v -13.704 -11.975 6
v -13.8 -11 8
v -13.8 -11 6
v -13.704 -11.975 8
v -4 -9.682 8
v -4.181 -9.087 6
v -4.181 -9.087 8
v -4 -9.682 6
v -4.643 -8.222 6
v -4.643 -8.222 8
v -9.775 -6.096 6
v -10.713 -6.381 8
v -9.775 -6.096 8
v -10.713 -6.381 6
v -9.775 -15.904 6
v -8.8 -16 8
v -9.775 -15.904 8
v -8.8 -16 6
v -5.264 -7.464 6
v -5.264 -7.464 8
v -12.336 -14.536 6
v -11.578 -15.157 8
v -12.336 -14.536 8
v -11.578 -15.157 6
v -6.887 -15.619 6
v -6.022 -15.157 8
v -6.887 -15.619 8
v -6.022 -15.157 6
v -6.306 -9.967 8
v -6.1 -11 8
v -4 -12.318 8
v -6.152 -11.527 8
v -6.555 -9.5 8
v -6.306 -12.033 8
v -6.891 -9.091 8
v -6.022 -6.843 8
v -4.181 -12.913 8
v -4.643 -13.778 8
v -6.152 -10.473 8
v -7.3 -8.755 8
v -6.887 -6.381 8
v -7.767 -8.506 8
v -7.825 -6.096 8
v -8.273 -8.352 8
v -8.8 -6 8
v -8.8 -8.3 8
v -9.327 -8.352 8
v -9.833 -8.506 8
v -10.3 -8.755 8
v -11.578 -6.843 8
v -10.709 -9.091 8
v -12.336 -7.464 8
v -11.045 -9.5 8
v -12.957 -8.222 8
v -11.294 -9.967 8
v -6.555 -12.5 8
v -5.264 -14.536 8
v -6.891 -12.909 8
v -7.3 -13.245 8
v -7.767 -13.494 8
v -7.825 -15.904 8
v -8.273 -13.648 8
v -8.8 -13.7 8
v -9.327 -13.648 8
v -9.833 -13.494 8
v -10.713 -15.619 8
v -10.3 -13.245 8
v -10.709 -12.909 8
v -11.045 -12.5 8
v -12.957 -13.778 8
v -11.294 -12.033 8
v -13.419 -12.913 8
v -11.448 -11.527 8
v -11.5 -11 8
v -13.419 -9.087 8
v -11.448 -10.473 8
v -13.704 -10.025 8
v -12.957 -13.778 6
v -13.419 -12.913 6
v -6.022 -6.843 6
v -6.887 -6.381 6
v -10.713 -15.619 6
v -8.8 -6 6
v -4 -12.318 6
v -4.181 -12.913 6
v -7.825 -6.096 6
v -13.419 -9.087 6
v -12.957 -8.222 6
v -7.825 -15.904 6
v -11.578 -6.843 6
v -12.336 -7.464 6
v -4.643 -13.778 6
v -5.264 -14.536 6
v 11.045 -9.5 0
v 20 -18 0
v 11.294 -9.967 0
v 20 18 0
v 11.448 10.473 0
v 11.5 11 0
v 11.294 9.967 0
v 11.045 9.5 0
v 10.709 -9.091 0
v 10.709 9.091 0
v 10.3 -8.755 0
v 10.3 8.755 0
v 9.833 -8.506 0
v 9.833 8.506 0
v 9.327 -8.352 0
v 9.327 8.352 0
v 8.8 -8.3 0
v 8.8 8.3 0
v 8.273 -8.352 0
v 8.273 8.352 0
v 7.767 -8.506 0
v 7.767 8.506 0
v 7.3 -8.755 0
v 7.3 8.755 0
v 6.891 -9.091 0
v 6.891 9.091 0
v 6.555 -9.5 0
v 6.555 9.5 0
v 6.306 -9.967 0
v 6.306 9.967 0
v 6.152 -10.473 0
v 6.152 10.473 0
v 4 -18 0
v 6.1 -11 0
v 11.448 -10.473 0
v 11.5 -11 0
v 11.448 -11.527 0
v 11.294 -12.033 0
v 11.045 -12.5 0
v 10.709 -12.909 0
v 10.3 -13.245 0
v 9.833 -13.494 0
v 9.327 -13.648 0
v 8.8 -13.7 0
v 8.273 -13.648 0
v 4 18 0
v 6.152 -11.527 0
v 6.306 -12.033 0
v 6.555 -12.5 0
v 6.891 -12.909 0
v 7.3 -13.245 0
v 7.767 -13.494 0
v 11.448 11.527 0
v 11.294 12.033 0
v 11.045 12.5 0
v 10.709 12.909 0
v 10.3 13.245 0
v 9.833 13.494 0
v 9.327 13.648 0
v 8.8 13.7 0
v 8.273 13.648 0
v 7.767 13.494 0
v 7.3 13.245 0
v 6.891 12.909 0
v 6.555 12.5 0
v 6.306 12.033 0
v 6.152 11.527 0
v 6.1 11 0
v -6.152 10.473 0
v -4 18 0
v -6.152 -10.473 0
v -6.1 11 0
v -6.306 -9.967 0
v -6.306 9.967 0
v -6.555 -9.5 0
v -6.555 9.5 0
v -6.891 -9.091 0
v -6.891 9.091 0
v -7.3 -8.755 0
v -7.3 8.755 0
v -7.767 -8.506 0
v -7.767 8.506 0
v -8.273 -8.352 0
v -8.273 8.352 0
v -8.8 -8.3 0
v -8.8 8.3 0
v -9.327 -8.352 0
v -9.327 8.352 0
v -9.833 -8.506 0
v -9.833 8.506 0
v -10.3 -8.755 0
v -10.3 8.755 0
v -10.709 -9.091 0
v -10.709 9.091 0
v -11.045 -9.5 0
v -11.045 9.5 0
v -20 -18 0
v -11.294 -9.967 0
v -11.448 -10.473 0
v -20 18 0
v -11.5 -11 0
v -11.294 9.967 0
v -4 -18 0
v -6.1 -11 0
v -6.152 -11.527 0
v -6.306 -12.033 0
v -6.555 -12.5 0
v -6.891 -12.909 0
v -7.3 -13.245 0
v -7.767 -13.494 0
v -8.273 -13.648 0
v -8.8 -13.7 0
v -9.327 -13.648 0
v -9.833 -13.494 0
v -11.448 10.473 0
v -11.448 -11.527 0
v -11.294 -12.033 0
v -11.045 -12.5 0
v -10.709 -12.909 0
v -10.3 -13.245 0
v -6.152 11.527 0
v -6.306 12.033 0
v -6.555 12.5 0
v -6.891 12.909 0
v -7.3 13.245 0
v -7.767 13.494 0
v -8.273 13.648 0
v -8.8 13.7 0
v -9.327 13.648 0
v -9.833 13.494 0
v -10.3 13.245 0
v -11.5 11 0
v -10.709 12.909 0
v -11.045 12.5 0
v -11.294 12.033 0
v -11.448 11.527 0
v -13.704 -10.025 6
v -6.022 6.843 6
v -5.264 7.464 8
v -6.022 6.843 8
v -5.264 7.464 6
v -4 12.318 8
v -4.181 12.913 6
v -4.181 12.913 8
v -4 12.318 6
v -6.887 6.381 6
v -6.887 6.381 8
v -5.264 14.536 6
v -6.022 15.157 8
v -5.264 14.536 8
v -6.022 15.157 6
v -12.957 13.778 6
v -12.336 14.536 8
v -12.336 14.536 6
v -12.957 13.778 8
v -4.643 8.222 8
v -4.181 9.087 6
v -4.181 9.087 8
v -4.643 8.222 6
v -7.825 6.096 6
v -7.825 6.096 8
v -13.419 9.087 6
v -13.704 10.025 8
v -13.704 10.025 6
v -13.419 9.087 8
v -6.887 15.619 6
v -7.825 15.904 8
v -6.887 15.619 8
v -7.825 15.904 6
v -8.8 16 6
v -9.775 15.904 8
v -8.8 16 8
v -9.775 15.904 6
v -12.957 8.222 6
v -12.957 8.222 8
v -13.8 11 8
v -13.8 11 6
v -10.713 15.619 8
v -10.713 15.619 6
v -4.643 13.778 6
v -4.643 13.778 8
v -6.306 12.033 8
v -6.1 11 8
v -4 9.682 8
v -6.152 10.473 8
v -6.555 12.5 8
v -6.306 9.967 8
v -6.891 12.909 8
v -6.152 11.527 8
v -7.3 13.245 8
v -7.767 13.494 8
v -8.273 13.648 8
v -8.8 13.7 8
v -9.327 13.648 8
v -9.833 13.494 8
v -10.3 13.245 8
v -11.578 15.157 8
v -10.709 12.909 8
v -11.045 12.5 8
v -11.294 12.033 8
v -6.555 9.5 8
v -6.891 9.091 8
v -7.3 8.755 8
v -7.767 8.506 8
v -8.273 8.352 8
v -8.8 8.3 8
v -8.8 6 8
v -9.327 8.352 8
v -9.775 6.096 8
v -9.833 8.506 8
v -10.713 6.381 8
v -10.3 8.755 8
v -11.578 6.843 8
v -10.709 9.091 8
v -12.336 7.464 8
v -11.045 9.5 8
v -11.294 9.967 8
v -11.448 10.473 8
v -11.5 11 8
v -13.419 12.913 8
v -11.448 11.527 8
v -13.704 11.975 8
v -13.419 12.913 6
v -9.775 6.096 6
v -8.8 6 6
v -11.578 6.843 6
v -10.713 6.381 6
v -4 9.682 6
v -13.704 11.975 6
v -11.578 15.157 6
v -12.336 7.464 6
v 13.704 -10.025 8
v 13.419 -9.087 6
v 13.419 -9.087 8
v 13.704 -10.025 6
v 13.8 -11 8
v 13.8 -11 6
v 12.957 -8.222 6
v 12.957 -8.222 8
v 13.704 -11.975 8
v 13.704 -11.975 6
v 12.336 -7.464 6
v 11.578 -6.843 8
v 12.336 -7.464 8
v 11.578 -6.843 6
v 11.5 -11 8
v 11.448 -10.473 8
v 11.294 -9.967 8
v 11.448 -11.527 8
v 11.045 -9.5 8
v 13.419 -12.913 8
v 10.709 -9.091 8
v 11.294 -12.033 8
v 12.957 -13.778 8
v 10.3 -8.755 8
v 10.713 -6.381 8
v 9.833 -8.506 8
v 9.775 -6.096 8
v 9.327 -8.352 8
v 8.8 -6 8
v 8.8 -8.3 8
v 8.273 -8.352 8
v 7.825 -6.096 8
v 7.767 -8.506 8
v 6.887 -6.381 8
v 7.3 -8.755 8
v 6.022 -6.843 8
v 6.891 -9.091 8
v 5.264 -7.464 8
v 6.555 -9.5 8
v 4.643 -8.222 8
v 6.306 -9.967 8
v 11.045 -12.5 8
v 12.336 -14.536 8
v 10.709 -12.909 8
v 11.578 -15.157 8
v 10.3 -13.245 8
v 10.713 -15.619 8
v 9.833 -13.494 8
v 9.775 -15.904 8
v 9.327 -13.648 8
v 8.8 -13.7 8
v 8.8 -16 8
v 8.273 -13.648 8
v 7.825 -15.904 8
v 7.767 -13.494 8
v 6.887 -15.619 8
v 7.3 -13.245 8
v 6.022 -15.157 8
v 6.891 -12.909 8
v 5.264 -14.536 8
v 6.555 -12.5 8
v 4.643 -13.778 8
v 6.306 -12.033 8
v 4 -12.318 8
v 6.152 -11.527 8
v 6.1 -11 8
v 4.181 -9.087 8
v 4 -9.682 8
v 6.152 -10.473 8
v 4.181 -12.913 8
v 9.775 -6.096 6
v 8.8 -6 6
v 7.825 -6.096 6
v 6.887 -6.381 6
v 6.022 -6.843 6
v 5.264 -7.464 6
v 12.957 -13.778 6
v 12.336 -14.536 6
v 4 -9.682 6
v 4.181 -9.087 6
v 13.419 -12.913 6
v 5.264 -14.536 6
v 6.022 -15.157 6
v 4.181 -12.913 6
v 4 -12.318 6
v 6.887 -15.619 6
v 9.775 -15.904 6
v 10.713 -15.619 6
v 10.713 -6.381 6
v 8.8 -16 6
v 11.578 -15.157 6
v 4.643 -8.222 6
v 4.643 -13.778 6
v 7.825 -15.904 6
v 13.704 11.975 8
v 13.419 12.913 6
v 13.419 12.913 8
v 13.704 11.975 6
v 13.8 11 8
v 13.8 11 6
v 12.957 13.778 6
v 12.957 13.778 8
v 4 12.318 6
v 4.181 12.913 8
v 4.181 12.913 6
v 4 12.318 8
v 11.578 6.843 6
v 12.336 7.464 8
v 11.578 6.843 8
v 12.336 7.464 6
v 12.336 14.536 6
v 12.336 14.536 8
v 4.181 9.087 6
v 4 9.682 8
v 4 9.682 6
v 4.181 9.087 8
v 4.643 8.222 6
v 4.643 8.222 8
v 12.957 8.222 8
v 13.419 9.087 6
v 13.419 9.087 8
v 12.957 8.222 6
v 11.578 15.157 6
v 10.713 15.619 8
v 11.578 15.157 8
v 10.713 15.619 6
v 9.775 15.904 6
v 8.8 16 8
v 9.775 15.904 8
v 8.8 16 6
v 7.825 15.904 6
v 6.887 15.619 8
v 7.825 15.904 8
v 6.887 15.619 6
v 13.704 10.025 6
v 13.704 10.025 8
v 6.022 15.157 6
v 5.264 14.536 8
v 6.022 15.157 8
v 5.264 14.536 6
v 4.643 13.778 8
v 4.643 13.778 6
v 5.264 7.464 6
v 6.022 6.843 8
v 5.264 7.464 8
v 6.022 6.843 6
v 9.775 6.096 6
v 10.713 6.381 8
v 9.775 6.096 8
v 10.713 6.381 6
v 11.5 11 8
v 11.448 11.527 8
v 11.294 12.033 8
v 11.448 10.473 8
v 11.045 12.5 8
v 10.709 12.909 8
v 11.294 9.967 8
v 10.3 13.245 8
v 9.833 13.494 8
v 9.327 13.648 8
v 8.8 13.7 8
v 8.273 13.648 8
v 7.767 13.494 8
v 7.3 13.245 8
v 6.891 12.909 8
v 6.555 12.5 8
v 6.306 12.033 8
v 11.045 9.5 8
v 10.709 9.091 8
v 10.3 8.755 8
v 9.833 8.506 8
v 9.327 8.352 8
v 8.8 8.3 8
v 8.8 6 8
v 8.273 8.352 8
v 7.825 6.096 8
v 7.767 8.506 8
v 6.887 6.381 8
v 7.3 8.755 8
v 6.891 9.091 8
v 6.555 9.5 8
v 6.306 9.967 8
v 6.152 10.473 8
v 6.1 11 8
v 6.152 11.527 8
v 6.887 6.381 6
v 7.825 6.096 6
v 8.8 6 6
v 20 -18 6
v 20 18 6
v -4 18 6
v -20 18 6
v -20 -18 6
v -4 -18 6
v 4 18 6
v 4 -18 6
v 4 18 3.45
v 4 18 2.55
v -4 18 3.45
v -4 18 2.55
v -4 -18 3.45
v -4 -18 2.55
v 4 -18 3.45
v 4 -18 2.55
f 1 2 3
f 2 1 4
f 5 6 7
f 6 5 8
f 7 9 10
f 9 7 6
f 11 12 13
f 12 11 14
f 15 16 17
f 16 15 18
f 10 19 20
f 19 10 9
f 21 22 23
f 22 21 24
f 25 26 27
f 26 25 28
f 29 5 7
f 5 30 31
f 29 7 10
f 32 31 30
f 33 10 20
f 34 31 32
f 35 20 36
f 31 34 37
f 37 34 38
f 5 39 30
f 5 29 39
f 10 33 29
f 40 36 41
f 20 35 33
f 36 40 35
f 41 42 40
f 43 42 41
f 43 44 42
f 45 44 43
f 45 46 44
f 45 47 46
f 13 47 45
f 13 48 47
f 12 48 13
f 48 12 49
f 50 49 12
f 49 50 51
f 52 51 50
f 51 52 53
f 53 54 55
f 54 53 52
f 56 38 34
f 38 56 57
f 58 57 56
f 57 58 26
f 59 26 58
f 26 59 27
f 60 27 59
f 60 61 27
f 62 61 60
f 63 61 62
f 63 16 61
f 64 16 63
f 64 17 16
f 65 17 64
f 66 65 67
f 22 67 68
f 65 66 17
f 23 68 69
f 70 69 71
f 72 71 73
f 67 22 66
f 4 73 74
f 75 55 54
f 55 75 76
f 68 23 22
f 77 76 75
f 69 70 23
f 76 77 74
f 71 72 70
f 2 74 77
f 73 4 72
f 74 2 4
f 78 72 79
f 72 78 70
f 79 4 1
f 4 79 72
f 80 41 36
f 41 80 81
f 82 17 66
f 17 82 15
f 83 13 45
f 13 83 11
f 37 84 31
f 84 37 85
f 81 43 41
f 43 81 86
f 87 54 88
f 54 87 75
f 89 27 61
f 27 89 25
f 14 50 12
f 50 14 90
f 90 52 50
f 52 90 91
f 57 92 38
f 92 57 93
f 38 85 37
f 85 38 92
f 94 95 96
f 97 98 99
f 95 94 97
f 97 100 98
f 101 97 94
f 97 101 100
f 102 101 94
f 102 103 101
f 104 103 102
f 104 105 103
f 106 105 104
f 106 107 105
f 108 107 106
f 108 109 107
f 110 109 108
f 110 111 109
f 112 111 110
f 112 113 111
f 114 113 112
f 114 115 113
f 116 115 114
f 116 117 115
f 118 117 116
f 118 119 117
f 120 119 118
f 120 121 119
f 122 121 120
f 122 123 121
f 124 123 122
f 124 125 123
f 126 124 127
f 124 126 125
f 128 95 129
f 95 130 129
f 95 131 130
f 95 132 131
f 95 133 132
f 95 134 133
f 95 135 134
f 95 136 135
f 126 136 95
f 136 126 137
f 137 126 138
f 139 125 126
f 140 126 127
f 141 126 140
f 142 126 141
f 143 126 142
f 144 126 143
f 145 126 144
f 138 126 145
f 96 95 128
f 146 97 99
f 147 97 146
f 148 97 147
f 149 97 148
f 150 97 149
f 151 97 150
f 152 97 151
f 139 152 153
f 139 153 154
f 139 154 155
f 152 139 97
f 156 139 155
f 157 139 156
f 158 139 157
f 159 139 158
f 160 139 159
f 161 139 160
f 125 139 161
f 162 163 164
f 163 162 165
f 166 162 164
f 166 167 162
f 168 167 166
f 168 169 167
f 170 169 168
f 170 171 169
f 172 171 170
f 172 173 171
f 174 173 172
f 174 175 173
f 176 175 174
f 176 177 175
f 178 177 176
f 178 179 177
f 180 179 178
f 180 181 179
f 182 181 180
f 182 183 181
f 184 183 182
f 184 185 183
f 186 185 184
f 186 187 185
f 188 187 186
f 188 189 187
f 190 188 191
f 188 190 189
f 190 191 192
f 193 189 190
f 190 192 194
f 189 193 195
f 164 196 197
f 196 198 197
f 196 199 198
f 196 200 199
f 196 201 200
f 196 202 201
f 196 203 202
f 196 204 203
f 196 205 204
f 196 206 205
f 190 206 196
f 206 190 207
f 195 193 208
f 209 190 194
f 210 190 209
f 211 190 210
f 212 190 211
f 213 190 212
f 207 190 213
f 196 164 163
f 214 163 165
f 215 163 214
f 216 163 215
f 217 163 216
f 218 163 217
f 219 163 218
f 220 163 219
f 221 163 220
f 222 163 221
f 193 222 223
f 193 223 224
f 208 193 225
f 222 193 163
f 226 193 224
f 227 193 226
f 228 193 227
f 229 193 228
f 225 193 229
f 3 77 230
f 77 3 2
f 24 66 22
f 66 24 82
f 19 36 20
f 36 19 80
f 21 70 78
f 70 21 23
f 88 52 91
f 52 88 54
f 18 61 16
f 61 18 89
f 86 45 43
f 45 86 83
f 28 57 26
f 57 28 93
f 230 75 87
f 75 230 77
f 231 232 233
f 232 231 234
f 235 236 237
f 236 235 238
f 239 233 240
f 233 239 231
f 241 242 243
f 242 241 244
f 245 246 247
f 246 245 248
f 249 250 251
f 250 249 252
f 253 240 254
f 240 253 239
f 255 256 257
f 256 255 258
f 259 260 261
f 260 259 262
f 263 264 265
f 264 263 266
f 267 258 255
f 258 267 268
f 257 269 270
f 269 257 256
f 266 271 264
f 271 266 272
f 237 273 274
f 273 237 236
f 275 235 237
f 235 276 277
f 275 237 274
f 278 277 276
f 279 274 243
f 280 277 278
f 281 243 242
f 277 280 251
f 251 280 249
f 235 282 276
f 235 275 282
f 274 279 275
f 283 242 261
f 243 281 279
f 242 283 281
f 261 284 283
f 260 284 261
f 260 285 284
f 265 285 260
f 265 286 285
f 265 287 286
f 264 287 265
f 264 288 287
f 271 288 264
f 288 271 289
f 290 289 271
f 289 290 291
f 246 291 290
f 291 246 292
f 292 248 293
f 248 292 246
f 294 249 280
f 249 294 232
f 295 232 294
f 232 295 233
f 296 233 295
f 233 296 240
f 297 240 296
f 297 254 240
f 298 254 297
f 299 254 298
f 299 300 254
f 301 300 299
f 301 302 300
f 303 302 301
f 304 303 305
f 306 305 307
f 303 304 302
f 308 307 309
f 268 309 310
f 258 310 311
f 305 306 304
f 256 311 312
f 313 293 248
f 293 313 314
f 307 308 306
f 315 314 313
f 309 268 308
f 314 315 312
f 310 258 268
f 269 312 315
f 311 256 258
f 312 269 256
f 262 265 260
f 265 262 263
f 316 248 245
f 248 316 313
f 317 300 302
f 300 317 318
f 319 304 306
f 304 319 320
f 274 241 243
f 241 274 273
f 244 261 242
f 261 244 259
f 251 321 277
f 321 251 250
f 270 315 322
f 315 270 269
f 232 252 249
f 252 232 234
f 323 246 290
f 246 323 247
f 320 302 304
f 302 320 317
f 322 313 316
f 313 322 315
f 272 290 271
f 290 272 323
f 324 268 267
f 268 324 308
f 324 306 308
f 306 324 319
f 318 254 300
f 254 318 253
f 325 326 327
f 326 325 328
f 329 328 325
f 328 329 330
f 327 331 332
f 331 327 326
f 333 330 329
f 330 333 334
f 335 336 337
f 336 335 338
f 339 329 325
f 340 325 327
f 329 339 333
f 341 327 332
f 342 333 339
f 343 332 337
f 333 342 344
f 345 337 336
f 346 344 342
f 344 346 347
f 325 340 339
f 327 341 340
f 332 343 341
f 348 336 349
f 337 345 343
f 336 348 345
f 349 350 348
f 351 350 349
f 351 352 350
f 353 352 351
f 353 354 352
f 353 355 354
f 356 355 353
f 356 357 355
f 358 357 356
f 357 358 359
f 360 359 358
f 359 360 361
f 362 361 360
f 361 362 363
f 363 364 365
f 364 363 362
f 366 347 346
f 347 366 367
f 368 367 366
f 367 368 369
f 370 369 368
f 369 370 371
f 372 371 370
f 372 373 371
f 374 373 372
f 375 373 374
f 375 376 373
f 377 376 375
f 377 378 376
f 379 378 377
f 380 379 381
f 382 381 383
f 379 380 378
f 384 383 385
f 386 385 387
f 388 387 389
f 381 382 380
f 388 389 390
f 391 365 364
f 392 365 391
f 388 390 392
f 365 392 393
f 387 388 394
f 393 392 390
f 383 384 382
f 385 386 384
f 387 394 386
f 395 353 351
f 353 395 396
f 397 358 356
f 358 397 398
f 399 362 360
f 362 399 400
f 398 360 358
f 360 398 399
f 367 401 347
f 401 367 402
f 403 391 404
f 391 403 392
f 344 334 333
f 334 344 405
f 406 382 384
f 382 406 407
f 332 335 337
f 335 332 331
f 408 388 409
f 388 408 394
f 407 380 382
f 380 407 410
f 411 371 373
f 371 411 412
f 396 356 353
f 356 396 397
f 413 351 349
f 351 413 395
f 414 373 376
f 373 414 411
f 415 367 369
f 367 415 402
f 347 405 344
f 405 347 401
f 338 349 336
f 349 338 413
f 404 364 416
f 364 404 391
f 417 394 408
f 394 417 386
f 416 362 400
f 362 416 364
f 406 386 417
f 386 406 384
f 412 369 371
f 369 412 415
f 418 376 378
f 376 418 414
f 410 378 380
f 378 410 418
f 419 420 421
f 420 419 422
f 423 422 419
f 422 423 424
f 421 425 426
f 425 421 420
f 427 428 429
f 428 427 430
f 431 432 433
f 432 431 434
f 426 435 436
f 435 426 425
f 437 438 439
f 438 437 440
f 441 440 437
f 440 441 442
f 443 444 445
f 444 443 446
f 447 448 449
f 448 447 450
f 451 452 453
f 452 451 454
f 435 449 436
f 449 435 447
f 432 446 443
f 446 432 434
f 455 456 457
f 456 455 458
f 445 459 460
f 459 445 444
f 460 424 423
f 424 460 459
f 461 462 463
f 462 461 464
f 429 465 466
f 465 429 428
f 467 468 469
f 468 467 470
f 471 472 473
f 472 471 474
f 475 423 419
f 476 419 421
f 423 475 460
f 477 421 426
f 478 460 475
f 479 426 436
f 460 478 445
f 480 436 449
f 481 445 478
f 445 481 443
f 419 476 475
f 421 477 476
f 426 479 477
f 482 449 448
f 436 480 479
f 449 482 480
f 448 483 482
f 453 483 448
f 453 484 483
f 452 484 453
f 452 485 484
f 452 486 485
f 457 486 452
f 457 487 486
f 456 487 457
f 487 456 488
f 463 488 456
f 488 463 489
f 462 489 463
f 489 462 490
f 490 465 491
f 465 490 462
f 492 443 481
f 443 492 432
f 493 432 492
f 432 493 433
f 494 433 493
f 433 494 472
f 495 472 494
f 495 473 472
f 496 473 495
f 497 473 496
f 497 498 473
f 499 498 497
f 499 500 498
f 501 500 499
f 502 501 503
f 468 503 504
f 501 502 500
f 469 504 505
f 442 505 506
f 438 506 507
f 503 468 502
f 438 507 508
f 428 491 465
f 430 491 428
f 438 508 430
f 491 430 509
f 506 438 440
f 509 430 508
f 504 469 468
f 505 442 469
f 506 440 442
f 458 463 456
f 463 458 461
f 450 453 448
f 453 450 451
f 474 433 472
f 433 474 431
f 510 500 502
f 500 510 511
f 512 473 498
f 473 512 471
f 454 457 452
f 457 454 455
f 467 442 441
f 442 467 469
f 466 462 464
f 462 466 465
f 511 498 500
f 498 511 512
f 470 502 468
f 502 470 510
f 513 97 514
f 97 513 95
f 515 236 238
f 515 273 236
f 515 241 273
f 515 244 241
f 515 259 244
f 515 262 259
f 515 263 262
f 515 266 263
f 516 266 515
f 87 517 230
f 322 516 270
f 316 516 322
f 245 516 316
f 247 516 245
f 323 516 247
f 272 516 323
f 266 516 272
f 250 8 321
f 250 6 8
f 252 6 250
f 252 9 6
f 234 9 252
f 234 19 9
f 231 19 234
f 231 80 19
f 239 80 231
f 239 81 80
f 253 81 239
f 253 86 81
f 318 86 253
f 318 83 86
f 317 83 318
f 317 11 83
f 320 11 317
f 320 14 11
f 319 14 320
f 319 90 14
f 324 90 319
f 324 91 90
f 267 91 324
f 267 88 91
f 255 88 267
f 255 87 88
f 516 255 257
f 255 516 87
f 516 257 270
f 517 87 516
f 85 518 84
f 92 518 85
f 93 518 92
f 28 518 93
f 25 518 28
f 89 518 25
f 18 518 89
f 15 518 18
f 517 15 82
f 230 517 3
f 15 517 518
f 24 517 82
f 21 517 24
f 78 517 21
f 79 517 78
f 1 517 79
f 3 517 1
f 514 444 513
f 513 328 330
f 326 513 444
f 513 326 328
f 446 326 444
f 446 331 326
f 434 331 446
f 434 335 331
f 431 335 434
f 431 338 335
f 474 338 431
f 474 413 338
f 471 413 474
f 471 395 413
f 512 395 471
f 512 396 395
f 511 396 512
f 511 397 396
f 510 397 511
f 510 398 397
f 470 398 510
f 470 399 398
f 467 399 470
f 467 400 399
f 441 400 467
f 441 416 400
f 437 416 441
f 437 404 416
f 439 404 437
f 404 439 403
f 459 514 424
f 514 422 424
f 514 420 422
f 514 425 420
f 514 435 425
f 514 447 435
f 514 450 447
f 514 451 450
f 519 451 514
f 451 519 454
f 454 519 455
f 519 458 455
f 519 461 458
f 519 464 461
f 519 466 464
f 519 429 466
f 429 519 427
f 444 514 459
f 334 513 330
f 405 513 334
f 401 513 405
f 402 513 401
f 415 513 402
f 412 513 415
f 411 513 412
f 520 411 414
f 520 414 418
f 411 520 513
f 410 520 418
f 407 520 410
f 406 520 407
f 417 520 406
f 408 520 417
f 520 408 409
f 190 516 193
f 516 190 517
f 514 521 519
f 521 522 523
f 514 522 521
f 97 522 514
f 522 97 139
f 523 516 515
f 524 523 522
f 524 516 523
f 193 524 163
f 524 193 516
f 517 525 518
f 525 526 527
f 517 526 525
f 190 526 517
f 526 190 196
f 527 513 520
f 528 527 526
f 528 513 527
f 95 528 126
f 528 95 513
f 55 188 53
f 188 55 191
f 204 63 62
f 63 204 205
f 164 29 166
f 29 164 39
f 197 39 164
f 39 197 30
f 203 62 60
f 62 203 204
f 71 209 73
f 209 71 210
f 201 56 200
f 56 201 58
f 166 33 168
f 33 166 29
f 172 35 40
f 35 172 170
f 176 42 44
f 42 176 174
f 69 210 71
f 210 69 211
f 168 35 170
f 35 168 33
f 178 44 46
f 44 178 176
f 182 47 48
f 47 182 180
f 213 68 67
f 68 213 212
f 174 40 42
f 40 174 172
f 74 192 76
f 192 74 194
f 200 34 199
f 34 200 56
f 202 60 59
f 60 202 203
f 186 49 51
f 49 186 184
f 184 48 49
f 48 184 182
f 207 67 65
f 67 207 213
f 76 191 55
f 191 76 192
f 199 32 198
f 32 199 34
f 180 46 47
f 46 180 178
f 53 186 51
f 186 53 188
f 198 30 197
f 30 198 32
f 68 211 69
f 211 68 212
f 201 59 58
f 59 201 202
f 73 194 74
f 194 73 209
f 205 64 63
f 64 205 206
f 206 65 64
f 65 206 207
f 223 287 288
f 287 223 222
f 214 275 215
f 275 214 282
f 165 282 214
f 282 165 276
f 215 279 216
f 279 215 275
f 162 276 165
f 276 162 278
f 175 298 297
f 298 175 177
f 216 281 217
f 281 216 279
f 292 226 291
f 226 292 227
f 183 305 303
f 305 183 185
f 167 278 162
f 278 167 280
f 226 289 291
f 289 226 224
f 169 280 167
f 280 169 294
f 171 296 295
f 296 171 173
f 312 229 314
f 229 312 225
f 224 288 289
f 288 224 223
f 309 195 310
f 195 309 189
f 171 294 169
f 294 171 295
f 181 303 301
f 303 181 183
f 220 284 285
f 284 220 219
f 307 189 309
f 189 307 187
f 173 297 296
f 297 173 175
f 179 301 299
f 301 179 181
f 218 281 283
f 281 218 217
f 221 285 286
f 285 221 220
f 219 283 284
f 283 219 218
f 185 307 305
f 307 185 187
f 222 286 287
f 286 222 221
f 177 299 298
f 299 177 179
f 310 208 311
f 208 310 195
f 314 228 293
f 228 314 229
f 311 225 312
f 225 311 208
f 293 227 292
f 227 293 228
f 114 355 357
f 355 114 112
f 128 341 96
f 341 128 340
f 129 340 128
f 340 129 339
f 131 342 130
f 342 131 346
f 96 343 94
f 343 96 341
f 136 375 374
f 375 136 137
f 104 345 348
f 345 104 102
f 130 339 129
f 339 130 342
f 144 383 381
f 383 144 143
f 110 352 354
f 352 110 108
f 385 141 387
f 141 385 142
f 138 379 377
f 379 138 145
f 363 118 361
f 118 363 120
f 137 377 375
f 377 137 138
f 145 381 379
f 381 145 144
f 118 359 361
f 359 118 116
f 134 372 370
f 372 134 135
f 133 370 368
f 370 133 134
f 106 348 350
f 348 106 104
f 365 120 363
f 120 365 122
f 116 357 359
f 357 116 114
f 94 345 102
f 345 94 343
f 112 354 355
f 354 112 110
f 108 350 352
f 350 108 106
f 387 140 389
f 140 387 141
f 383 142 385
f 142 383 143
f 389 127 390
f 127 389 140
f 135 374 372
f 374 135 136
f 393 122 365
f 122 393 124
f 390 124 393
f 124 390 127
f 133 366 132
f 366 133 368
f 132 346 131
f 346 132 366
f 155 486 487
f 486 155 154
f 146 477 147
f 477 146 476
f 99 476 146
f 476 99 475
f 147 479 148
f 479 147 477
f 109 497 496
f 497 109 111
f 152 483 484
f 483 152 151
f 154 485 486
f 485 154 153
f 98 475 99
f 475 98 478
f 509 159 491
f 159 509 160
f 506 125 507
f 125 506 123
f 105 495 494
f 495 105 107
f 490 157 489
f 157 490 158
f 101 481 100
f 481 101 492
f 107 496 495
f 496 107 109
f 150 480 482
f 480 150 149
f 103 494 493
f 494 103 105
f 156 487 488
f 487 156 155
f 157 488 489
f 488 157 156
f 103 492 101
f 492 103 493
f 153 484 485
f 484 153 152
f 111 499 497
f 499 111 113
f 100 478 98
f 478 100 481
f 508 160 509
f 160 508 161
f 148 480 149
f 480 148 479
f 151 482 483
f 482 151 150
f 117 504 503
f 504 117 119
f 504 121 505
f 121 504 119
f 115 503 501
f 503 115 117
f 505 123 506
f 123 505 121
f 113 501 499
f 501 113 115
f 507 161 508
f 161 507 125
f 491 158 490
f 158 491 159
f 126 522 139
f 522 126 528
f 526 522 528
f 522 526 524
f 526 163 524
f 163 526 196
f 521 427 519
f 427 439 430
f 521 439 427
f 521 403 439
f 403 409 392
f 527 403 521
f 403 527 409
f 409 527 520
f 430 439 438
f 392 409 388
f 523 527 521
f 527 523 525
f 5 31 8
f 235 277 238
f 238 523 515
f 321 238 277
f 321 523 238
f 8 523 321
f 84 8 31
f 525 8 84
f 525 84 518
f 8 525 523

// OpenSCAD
$fn = 32;

// ----------------------------------------------------------------------
// Living hinge: 40 x 36 mm plates, 0.9 mm flexible web
// ----------------------------------------------------------------------

// --- parameters (mm) ---
plate_len = 16;           // plate length outside the web
plate_w = 36;             // plate width
thick = 6;                // plate thickness
web_half = 4;             // half width of the flex band
web_t = 0.9;              // flexible web thickness
web_z = 2.55;             // web position inside the thickness
boss_d = 10;              // screw boss diameter
boss_h = 8;               // screw boss height
boss_x = 8.8;             // screw boss distance from the web
screw_d = 5.4;            // screw hole

difference() {
  union() {
    /* one flat strip, later thinned at the middle */
    translate([-20, -18, 0]) cube([40, 36, 6]);
    /* screw bosses, sunk 0.5 mm into the plates */
    for (sx = [-8.8, 8.8]) {
      for (sy = [-11, 11]) {
        translate([sx, sy, 0]) cylinder(h = boss_h, d = boss_d);
      }
    }
  }
  /* channel from below: leaves the web on top of it */
  translate([-4, -20.5, -2.5]) cube([8, 41, 5.05]);
  /* channel from above: thins the web down to web_t */
  translate([-4, -20.5, 3.45]) cube([8, 41, 5.05]);
  /* screw holes through the bosses */
  for (sx = [-8.8, 8.8]) {
    for (sy = [-11, 11]) {
      translate([sx, sy, -2.5]) cylinder(h = boss_h + 5, d = screw_d);
    }
  }
}
